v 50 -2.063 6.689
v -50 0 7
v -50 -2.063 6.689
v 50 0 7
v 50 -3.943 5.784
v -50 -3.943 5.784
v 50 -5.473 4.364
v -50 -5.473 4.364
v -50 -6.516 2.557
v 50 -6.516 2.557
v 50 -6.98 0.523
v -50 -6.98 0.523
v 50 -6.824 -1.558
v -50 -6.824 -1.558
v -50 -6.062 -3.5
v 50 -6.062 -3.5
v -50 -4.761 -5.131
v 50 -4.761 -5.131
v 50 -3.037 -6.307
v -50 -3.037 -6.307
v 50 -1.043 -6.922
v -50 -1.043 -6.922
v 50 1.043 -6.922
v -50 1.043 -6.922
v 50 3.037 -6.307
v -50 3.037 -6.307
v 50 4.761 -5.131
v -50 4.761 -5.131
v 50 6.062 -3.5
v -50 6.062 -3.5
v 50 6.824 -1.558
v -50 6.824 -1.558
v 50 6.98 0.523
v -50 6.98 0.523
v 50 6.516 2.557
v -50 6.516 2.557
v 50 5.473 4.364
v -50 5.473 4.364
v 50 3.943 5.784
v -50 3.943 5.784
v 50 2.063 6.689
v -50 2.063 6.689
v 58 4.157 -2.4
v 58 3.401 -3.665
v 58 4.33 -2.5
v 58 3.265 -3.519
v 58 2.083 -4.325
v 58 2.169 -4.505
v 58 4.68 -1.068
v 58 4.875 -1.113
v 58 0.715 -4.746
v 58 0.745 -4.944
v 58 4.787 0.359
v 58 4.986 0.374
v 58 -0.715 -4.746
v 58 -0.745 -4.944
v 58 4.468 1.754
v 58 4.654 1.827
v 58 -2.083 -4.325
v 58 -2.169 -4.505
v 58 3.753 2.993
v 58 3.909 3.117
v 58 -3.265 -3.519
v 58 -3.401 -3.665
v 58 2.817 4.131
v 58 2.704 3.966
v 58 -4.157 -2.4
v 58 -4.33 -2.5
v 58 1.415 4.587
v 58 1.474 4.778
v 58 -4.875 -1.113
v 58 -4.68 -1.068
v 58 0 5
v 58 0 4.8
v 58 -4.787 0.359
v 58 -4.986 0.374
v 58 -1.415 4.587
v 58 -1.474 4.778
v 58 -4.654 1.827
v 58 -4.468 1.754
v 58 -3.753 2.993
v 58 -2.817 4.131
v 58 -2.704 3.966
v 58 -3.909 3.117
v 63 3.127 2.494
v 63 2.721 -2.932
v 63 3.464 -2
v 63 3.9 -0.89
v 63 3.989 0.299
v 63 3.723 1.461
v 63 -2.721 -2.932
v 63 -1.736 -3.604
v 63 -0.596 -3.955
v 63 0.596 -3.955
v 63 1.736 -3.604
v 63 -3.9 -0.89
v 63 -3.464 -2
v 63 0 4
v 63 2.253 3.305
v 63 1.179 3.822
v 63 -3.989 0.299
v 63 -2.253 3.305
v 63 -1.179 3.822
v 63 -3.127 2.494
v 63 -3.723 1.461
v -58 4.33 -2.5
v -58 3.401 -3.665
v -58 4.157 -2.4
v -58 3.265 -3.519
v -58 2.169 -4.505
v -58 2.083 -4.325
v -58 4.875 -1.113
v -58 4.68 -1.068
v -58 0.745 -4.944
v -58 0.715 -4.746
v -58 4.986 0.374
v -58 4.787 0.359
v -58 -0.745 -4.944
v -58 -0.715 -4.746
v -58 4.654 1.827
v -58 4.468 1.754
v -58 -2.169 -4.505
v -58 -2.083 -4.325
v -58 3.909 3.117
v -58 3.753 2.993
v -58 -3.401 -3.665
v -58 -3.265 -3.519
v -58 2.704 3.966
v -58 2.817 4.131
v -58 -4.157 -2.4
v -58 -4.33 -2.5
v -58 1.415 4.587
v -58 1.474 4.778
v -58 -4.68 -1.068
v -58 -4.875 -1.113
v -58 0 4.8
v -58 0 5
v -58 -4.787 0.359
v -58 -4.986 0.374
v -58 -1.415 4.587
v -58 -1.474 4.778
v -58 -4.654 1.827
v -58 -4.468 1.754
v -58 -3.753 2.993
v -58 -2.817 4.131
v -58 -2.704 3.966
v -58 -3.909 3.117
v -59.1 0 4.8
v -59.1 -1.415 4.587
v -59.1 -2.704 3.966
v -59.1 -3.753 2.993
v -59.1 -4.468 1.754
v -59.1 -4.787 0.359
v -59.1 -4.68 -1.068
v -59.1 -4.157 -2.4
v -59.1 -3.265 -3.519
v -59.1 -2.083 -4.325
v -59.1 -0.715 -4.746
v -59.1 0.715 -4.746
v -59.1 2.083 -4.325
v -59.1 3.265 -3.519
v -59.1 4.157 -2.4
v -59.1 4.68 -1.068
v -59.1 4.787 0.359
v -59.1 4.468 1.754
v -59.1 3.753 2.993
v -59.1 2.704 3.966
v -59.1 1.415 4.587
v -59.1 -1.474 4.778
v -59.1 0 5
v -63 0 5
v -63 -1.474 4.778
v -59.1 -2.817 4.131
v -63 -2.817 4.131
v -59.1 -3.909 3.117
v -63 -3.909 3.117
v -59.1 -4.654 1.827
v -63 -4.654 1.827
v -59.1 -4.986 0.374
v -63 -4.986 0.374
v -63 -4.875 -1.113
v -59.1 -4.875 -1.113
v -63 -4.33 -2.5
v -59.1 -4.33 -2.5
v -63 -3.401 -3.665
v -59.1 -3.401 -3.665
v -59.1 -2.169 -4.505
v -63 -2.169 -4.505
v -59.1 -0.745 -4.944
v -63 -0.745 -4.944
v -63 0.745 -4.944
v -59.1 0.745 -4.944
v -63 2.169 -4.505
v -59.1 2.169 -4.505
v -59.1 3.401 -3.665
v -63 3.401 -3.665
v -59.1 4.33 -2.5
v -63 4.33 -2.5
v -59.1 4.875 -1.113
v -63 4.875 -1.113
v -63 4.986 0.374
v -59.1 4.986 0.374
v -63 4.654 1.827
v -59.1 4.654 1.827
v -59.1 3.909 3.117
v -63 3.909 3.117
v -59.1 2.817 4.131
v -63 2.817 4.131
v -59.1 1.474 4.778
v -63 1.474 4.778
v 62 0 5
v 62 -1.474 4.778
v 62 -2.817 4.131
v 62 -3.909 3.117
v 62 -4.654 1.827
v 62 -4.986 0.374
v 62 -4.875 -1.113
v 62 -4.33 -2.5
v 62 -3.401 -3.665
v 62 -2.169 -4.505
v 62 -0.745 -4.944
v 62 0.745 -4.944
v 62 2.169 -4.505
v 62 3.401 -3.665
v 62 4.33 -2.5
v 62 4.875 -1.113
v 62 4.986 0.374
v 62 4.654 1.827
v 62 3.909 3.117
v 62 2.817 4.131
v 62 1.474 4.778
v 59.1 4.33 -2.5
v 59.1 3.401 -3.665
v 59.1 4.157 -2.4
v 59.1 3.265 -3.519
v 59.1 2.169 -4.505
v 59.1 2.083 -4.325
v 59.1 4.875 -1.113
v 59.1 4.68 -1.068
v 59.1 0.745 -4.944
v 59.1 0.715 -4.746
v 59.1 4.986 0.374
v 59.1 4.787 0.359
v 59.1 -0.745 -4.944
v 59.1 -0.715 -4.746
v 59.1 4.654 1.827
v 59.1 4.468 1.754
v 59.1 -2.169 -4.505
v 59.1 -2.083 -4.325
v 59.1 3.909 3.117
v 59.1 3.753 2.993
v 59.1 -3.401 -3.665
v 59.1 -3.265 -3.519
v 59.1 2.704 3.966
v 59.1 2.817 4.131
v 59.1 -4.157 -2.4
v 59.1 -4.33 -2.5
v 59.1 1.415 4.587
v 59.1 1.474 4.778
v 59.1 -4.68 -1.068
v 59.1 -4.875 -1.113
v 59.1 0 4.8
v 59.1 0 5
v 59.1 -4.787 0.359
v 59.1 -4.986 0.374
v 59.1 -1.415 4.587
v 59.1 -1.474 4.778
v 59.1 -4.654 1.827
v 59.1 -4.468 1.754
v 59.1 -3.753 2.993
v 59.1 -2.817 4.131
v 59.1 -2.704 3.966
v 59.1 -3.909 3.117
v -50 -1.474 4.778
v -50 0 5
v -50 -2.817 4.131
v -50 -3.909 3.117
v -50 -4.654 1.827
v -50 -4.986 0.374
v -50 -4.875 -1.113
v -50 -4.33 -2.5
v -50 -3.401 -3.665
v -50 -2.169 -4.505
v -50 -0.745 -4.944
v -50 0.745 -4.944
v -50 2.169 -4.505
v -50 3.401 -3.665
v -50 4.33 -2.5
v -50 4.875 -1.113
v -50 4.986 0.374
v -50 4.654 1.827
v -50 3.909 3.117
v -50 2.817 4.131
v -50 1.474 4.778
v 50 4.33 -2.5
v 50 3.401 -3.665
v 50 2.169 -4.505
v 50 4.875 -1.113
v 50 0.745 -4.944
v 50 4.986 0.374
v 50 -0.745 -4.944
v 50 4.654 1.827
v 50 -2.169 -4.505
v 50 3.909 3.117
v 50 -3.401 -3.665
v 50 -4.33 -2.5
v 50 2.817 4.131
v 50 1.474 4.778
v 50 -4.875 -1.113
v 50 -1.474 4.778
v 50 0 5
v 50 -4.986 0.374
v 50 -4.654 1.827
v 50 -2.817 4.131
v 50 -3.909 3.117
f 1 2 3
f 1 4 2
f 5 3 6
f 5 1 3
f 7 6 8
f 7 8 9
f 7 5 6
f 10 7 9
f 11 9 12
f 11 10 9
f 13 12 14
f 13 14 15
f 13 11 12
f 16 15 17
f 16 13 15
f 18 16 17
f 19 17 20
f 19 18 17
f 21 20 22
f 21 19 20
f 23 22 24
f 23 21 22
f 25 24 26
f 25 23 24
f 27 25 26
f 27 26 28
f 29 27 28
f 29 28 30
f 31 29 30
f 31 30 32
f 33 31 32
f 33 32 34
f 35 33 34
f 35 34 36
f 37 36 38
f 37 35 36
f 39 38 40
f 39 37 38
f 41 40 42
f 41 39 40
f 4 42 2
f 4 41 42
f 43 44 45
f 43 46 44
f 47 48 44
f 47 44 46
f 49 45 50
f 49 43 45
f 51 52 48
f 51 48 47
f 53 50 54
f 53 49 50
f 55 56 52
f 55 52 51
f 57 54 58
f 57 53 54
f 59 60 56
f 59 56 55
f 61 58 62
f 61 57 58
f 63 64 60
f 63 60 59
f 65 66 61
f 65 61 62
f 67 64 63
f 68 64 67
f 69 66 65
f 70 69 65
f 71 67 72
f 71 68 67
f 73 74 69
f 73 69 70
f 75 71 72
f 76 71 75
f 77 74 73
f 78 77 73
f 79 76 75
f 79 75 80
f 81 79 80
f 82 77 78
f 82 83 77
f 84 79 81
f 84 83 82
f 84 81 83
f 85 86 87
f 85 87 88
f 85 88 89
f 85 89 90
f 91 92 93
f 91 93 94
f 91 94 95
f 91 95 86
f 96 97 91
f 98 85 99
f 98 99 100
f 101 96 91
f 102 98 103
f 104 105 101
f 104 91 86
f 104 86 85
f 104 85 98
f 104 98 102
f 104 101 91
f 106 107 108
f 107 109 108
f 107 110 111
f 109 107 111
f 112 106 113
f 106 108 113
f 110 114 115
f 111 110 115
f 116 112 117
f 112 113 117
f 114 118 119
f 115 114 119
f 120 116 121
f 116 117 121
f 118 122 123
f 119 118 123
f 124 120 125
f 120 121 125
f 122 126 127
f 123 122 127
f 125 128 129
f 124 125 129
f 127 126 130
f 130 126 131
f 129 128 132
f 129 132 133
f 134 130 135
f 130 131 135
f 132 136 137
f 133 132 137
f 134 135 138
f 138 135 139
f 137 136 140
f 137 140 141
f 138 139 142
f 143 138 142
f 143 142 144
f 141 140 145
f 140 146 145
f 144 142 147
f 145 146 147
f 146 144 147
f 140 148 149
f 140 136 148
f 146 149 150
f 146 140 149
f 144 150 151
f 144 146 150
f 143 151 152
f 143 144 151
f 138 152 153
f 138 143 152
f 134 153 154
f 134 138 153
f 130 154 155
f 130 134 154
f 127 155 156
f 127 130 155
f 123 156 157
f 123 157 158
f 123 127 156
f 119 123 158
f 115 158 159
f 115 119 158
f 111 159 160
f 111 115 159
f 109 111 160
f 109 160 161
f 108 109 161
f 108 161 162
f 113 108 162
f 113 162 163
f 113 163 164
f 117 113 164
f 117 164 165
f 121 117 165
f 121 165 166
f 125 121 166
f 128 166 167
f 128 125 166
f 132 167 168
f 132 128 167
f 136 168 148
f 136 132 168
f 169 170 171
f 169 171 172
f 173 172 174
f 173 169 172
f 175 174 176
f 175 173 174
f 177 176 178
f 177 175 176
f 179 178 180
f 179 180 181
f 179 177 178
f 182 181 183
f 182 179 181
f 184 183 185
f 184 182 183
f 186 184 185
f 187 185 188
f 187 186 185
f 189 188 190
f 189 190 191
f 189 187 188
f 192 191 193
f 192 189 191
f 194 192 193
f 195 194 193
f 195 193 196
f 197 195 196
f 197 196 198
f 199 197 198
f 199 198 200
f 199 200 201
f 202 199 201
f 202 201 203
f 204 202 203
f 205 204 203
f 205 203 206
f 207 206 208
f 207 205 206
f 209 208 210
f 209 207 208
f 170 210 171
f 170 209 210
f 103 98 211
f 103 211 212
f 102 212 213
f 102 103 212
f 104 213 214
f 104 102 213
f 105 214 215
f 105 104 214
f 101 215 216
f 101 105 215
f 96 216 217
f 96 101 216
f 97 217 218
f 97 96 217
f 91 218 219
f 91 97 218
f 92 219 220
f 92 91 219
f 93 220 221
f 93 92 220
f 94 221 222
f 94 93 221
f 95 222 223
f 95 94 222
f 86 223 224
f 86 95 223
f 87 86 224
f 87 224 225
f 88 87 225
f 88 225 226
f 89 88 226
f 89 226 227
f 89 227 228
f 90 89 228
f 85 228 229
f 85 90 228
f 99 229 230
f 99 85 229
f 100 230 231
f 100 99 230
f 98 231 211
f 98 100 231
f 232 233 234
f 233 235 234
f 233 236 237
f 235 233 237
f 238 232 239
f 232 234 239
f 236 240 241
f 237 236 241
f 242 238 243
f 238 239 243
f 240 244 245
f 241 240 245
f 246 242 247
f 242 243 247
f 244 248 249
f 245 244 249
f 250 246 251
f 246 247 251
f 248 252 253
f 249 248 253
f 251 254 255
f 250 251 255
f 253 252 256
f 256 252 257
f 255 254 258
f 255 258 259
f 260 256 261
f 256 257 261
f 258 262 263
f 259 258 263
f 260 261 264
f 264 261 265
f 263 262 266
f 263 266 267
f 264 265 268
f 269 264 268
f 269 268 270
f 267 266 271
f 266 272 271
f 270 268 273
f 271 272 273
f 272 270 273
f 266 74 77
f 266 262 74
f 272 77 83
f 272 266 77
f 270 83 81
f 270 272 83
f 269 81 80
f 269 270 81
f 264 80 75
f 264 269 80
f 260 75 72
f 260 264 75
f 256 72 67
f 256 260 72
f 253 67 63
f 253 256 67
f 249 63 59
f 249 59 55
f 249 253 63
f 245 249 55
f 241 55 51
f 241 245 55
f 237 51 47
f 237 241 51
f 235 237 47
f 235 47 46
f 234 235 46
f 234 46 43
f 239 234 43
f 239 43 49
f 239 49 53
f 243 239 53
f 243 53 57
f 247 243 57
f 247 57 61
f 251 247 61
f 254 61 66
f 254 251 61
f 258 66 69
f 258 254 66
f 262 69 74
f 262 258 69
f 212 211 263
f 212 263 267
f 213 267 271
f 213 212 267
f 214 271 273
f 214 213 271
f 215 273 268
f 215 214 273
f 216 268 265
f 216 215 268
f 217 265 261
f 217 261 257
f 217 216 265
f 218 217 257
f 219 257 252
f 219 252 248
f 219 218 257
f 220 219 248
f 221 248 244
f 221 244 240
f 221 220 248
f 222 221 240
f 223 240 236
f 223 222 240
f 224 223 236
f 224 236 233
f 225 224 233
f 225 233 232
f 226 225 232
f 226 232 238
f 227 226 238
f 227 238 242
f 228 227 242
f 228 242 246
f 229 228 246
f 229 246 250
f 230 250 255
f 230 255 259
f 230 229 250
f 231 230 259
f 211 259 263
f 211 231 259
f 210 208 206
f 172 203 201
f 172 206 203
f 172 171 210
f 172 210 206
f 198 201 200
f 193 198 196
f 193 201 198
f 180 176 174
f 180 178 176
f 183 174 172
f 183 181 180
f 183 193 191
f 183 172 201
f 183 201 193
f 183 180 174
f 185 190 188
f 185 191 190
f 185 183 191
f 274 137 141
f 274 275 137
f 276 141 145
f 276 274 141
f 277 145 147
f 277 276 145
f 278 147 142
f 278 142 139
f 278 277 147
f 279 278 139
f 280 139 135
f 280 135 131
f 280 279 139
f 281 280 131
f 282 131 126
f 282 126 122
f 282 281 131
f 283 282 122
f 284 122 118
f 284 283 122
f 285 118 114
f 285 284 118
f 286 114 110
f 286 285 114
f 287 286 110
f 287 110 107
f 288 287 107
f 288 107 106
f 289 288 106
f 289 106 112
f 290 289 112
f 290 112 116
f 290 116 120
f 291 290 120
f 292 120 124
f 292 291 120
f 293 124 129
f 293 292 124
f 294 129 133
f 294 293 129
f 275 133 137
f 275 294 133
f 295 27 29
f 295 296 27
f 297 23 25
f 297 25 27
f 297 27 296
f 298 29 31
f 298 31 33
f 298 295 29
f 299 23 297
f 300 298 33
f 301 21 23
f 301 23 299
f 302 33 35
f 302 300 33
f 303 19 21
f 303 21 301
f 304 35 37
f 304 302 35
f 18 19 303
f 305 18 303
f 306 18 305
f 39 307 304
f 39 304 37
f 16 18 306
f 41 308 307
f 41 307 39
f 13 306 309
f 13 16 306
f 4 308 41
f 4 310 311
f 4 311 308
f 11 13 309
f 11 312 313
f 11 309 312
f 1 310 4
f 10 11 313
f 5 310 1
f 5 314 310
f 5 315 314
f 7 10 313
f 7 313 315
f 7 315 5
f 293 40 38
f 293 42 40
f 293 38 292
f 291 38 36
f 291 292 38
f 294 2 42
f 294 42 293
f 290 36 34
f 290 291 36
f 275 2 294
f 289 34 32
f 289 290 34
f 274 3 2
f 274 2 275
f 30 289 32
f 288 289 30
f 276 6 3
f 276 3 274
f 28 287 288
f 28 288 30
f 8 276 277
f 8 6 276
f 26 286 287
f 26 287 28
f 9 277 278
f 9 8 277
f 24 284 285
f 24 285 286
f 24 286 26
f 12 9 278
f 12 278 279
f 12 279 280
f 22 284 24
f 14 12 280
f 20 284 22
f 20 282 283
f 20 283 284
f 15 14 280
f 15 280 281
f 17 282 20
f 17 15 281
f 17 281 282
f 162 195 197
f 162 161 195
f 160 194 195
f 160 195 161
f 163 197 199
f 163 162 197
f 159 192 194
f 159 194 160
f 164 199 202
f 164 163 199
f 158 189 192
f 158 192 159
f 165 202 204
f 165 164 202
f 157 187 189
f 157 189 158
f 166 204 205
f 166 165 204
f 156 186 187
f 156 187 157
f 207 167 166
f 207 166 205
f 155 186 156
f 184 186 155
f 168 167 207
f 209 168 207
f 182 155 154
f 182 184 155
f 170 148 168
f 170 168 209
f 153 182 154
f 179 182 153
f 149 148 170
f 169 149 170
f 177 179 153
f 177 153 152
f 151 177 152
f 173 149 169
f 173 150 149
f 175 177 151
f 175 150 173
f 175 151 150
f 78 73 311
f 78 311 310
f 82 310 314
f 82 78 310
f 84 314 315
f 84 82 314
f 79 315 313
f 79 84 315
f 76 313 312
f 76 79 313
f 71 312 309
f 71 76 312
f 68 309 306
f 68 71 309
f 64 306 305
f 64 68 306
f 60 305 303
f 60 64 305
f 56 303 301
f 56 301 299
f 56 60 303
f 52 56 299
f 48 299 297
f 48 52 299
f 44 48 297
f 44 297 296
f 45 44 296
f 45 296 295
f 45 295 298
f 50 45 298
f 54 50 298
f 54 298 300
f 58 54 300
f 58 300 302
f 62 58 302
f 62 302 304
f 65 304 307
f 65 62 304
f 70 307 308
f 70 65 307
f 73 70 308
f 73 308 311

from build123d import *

# Parameters (mm, degrees)
SKIZZE2_W  = 1.1
SKIZZE2_H  = 0.2
FASE1_SIZE = 1


with BuildPart() as part:
    # Skizze1 → Rotation1 (revolve)
    with BuildSketch(Plane(origin=(0, 0, 0), x_dir=(1, 0, 0), z_dir=(0, 1, 0))):
        Polygon((-63, -5), (-50, -5), (-50, -7), (50, -7), (50, -5), (63, -5), (63, 0), (-63, 0), align=None)
    revolve(axis=Axis((-125.234019669, 0, 0), (1, 0, 0)))

    # Skizze2 → Schnitt-Rotation1 (revolve, cut)
    with BuildSketch(Plane(origin=(0, 0, 0), x_dir=(1, 0, 0), z_dir=(0, 1, 0))):
        with Locations((58.55, -4.9)):
            Rectangle(SKIZZE2_W, SKIZZE2_H)
        with Locations((-58.55, -4.9)):
            Rectangle(SKIZZE2_W, SKIZZE2_H)
    revolve(axis=Axis((0, 0, 0), (1, 0, 0)), mode=Mode.SUBTRACT)

    # Fase1
    fase1_edges = [part.edges().sort_by_distance(p)[0] for p in [
        (63, 0, -5),
    ]]
    chamfer(fase1_edges, length=FASE1_SIZE)


solid = part.part
